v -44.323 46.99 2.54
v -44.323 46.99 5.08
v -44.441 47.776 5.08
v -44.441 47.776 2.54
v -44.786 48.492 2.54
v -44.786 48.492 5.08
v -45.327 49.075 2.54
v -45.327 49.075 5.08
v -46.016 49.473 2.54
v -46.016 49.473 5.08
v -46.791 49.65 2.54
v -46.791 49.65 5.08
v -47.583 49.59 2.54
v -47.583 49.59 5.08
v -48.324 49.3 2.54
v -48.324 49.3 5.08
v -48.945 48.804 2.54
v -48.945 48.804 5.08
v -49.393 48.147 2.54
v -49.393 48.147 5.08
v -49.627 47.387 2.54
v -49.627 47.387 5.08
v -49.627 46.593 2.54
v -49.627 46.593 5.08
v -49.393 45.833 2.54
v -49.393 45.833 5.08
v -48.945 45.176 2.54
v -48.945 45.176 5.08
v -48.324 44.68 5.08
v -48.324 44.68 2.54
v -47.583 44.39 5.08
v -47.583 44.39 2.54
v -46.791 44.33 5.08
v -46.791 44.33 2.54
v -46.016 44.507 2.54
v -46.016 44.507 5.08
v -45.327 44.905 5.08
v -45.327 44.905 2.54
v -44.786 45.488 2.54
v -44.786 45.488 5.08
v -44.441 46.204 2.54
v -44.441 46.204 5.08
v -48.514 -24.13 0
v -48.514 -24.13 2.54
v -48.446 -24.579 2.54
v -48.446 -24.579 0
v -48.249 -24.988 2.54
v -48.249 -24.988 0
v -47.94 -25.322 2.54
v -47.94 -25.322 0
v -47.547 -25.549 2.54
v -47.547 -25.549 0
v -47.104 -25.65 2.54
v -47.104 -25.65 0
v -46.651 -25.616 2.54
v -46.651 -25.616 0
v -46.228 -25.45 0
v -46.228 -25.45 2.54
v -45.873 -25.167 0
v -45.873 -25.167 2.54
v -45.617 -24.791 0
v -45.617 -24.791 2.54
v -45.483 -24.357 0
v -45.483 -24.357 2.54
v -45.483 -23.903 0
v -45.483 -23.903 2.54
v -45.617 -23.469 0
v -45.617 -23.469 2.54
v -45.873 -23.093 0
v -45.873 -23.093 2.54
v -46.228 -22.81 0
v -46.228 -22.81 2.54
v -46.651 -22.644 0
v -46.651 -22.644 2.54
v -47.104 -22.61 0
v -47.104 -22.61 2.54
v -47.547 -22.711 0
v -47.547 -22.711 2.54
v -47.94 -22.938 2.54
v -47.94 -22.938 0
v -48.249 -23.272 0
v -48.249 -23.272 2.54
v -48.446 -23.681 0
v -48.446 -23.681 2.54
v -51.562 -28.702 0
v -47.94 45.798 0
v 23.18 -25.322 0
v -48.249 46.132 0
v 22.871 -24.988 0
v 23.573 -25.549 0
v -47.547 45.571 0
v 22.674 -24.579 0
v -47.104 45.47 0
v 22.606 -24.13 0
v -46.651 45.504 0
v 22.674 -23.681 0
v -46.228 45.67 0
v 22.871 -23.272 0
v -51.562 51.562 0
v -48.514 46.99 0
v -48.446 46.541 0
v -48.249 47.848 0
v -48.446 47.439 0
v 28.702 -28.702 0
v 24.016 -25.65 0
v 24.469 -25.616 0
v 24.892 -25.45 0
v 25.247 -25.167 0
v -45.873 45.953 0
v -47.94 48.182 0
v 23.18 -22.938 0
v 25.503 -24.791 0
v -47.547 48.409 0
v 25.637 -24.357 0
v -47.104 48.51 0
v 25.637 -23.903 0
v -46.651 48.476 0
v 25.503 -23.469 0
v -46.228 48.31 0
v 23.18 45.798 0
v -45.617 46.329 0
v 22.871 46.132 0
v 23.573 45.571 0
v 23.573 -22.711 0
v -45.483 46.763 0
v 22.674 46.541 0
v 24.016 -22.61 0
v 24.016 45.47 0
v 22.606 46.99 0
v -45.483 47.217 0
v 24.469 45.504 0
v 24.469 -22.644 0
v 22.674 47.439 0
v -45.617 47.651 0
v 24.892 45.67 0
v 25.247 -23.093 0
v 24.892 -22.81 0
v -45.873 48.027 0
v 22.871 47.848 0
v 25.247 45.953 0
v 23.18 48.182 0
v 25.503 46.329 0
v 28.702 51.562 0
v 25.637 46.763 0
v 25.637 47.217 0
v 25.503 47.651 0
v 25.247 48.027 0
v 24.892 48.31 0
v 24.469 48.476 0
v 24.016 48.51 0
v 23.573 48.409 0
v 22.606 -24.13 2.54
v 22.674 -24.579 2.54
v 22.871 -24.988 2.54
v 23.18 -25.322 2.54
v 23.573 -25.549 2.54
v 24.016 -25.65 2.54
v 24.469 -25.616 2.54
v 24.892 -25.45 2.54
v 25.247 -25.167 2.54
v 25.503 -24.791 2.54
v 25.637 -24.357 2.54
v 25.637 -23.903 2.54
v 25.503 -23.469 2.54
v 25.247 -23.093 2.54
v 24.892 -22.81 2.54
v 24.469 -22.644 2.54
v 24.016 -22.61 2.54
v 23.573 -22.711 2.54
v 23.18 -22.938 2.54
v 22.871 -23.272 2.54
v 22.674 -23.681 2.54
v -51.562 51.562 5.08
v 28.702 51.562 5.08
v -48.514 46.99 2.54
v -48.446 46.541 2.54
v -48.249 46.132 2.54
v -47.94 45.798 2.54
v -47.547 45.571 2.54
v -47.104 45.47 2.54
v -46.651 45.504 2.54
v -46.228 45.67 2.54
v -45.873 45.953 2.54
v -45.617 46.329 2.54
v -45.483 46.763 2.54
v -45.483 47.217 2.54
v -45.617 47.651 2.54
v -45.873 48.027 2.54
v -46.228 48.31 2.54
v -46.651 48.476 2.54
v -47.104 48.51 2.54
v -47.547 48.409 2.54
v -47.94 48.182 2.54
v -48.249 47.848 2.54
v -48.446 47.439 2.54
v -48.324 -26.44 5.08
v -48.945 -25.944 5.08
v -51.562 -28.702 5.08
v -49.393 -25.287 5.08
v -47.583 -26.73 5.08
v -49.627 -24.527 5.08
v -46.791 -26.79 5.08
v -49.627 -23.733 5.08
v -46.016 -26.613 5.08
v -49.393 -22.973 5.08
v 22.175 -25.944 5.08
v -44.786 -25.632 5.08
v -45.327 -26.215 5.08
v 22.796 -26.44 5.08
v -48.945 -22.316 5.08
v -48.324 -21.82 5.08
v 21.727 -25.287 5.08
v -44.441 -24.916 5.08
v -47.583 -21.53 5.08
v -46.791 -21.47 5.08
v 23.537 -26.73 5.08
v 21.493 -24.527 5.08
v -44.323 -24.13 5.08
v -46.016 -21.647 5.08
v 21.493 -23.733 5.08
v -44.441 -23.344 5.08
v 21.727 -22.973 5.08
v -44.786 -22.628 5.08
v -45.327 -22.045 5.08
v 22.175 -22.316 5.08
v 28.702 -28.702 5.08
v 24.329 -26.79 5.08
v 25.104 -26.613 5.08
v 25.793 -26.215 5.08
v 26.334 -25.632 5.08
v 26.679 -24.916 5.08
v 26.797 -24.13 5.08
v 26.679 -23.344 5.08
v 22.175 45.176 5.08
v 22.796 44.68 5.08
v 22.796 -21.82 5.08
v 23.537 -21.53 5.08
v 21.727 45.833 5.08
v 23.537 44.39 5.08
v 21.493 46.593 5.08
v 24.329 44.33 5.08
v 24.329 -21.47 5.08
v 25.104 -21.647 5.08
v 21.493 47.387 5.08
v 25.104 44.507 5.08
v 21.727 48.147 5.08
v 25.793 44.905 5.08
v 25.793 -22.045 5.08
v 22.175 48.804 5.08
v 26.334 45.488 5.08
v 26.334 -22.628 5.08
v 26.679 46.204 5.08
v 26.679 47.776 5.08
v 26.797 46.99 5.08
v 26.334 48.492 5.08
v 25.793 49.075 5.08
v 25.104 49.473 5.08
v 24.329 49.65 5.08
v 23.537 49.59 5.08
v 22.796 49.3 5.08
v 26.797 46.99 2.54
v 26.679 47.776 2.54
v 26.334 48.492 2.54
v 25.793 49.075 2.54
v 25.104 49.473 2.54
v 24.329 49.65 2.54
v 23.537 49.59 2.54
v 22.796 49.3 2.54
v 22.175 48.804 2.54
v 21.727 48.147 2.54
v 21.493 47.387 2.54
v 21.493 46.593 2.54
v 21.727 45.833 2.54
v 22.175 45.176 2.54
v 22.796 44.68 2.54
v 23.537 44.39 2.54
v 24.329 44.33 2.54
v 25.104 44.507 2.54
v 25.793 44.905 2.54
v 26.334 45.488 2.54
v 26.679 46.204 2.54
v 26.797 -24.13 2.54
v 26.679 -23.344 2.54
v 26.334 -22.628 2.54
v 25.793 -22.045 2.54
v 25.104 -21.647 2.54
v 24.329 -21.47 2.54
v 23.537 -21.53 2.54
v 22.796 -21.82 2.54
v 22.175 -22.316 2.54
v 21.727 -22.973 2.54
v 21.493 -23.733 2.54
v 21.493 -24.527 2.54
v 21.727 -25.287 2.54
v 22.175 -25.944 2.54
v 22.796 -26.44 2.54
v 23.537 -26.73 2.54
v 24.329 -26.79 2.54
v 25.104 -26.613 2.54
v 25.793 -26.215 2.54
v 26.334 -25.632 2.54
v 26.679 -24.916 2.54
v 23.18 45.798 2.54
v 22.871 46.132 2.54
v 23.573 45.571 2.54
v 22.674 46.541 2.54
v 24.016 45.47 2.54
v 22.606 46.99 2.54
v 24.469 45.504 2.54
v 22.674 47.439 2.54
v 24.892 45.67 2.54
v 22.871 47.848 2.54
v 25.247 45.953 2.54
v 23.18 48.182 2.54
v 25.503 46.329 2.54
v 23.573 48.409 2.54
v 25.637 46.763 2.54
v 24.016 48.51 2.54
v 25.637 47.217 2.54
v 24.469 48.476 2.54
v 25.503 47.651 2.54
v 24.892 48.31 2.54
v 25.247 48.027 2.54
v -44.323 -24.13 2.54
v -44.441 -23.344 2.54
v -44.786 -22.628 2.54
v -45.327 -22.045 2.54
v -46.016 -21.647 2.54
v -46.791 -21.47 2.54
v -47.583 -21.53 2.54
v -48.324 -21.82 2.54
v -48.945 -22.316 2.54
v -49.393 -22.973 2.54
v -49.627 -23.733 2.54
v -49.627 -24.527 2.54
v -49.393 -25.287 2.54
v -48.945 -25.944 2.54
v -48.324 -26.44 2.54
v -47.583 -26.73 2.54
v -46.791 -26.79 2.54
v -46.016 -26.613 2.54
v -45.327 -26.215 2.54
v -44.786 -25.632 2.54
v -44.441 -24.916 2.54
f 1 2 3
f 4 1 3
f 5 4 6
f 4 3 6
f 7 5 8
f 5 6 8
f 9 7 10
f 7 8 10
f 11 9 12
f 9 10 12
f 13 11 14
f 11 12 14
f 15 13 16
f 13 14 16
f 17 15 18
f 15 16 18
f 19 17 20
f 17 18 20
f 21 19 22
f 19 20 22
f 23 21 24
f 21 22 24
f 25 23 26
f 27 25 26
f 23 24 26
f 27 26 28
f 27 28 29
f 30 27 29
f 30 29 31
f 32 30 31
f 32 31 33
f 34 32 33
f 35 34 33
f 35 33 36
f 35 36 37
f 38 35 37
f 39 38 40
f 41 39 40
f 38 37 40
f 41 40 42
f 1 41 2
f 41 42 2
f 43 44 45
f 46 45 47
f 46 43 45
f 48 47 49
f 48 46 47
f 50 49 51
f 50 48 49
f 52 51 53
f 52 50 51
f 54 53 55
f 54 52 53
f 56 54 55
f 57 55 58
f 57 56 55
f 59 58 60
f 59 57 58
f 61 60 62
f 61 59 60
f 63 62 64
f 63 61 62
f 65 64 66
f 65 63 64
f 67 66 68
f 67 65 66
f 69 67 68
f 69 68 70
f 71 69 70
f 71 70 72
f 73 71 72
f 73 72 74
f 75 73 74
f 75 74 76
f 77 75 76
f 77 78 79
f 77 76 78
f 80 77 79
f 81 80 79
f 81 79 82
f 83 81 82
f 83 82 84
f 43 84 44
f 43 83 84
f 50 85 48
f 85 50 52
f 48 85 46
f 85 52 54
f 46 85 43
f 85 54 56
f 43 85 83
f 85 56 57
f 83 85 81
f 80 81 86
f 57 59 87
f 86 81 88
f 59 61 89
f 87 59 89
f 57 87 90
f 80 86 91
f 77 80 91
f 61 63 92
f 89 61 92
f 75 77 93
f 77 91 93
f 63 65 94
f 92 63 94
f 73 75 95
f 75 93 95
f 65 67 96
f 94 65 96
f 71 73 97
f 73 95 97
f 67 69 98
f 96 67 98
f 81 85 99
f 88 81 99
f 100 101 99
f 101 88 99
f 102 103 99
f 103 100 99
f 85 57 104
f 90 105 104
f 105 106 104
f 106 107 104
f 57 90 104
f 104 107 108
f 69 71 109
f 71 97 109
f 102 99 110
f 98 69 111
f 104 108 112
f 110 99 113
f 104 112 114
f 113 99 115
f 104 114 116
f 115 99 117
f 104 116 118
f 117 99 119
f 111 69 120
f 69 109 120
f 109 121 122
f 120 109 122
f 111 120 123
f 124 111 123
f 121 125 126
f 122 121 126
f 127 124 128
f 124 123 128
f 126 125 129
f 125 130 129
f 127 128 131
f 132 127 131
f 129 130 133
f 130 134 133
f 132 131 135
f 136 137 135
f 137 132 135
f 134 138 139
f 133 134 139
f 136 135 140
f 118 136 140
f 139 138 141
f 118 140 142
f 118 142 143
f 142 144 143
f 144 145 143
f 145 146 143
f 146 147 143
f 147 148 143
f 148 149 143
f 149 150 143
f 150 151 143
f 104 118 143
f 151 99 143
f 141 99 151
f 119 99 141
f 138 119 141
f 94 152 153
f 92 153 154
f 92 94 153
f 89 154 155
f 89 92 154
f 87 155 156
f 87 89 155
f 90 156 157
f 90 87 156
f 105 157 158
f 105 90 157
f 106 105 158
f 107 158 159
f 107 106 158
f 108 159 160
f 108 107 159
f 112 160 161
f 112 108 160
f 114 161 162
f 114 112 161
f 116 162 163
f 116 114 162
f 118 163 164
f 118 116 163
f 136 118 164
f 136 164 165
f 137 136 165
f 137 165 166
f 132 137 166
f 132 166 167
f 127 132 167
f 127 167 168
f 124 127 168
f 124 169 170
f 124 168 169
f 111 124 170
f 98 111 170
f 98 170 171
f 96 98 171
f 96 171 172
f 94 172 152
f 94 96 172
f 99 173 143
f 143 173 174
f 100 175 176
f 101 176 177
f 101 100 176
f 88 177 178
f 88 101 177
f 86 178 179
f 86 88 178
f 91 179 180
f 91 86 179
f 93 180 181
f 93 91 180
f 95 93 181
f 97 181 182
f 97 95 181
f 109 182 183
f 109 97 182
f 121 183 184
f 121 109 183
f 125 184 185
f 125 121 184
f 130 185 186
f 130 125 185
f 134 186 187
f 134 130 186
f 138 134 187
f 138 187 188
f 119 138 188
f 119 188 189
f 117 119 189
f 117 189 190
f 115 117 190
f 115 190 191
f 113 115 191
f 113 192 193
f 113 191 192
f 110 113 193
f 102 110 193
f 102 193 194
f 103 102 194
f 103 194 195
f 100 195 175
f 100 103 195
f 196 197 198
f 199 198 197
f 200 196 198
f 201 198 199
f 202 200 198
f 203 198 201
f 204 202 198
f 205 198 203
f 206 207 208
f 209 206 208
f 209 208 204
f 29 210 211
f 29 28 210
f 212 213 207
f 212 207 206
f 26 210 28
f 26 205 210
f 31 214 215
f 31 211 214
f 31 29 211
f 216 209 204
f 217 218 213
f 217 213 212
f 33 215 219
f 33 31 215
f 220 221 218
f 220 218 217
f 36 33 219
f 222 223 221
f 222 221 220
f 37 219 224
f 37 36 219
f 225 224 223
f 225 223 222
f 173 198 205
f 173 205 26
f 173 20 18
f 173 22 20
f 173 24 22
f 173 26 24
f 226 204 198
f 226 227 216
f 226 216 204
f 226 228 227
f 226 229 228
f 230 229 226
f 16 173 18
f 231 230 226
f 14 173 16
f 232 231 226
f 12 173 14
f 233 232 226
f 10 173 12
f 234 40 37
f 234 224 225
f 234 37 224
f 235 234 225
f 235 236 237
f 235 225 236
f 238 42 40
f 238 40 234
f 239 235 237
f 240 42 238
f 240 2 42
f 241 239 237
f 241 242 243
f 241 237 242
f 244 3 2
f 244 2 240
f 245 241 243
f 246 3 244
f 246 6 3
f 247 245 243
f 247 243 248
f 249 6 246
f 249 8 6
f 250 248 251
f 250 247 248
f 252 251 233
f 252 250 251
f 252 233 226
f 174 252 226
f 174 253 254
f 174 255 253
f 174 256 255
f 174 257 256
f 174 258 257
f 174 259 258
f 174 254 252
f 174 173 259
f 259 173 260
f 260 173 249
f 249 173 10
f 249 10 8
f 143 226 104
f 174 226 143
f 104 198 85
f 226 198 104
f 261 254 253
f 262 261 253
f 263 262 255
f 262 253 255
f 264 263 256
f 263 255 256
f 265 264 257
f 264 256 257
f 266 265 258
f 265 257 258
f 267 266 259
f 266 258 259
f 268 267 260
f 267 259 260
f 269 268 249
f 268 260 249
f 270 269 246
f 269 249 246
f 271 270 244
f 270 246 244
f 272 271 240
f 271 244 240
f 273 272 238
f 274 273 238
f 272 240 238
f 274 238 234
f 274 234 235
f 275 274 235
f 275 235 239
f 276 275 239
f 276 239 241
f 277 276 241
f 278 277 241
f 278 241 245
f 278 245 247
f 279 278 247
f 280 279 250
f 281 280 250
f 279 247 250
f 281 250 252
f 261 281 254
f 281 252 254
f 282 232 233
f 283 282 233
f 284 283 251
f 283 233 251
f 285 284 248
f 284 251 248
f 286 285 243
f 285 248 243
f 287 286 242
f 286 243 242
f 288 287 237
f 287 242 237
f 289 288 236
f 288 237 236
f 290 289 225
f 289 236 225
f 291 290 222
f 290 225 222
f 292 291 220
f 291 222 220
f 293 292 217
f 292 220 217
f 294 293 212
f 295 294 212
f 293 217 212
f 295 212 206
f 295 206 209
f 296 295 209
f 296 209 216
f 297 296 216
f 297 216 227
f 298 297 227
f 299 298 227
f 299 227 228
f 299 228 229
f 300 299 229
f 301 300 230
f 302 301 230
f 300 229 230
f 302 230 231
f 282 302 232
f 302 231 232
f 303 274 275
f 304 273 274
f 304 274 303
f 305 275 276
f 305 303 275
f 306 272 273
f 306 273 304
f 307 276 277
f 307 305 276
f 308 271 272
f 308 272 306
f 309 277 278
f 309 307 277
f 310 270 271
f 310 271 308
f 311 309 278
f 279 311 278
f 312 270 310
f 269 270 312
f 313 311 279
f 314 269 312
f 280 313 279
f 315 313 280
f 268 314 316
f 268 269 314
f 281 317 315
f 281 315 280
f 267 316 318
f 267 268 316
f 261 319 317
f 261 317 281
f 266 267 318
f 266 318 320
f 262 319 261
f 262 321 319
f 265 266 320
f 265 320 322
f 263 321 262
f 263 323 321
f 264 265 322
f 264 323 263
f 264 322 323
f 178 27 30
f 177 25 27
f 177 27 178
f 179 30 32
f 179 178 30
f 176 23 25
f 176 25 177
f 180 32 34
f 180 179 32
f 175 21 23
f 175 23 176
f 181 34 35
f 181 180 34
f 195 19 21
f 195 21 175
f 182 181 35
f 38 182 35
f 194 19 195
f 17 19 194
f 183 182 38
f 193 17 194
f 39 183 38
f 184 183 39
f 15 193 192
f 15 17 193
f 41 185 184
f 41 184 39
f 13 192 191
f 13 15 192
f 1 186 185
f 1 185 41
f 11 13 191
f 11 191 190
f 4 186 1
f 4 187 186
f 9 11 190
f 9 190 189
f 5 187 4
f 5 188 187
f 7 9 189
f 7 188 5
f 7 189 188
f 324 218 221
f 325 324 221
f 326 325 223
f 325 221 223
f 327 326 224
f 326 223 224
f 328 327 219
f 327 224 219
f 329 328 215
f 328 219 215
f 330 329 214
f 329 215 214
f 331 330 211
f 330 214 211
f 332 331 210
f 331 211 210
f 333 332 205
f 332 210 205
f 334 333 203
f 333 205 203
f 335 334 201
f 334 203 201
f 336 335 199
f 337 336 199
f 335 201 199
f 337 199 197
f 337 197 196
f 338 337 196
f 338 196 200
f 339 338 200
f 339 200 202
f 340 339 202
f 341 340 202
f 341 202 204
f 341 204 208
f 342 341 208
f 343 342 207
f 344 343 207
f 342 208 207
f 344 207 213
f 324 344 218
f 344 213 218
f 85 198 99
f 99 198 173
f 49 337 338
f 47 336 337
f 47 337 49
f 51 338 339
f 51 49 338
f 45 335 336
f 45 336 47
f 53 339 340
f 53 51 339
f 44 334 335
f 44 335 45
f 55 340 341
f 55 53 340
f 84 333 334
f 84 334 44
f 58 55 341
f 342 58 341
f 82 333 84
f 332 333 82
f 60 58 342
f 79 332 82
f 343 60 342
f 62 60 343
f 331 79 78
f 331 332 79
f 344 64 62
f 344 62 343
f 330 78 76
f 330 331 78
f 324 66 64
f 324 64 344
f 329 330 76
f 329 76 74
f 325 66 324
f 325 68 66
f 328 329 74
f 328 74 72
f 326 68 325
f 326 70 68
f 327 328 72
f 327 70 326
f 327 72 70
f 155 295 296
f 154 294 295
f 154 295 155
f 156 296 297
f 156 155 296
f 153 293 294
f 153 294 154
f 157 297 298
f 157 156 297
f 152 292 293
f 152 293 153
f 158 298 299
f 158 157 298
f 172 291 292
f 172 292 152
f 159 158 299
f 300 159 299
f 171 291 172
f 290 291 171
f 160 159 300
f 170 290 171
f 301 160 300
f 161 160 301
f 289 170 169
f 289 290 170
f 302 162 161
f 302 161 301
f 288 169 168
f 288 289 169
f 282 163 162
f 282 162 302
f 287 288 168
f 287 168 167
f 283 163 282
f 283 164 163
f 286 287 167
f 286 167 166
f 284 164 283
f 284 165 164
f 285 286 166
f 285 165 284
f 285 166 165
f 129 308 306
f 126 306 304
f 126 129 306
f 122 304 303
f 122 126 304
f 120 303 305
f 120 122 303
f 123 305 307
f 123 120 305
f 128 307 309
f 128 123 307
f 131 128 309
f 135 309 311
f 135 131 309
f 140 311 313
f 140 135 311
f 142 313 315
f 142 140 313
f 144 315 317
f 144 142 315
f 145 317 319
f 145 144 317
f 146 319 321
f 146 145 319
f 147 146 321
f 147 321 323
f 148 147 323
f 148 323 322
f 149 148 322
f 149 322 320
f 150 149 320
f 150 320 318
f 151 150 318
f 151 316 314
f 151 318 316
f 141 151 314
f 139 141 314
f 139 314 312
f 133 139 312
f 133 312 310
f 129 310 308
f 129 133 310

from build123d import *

# Parameters (mm, degrees)
SKETCH1_W           = 81.28
SKETCH1_H           = 81.28
SKETCH1_R           = 1.524
BOSS_EXTRUDE1_DEPTH = 5.08
SKETCH2_R           = 2.667
CUT_EXTRUDE1_DEPTH  = 2.54
SKETCH3_W           = 81.28
SKETCH3_H           = 81.28
SKETCH3_W_2         = 80.264
SKETCH3_H_2         = 80.264
CUT_EXTRUDE2_DEPTH  = 74.813116721


with BuildPart() as part:
    # Sketch1 → Boss-Extrude1 (new body)
    with BuildSketch(Plane.XY):
        with Locations((-11.43, 11.43)):
            Rectangle(SKETCH1_W, SKETCH1_H)
        with Locations(Location((-46.99, 46.99, 0), (0, 0, 180))):
            Circle(SKETCH1_R, mode=Mode.SUBTRACT)
        with Locations(Location((-46.99, -24.13, 0), (0, 0, 180))):
            Circle(SKETCH1_R, mode=Mode.SUBTRACT)
        with Locations(Location((24.13, -24.13, 0), (0, 0, 180))):
            Circle(SKETCH1_R, mode=Mode.SUBTRACT)
        with Locations(Location((24.13, 46.99, 0), (0, 0, 180))):
            Circle(SKETCH1_R, mode=Mode.SUBTRACT)
    extrude(amount=BOSS_EXTRUDE1_DEPTH)

    # Sketch2 → Cut-Extrude1 (cut)
    with BuildSketch(Plane.XY.offset(5.08)):
        with Locations((-46.99, -24.13)):
            Circle(SKETCH2_R)
        with Locations((-46.99, 46.99)):
            Circle(SKETCH2_R)
        with Locations((24.13, 46.99)):
            Circle(SKETCH2_R)
        with Locations((24.13, -24.13)):
            Circle(SKETCH2_R)
    extrude(amount=-CUT_EXTRUDE1_DEPTH, mode=Mode.SUBTRACT)

    # Sketch3 → Cut-Extrude2 (cut, through all)
    with BuildSketch(Plane.XY.offset(5.08)):
        with Locations((-11.43, 11.43)):
            Rectangle(SKETCH3_W, SKETCH3_H)
        with Locations((-11.43, 11.43)):
            Rectangle(SKETCH3_W_2, SKETCH3_H_2, mode=Mode.SUBTRACT)
    extrude(amount=-CUT_EXTRUDE2_DEPTH, mode=Mode.SUBTRACT)


solid = part.part
